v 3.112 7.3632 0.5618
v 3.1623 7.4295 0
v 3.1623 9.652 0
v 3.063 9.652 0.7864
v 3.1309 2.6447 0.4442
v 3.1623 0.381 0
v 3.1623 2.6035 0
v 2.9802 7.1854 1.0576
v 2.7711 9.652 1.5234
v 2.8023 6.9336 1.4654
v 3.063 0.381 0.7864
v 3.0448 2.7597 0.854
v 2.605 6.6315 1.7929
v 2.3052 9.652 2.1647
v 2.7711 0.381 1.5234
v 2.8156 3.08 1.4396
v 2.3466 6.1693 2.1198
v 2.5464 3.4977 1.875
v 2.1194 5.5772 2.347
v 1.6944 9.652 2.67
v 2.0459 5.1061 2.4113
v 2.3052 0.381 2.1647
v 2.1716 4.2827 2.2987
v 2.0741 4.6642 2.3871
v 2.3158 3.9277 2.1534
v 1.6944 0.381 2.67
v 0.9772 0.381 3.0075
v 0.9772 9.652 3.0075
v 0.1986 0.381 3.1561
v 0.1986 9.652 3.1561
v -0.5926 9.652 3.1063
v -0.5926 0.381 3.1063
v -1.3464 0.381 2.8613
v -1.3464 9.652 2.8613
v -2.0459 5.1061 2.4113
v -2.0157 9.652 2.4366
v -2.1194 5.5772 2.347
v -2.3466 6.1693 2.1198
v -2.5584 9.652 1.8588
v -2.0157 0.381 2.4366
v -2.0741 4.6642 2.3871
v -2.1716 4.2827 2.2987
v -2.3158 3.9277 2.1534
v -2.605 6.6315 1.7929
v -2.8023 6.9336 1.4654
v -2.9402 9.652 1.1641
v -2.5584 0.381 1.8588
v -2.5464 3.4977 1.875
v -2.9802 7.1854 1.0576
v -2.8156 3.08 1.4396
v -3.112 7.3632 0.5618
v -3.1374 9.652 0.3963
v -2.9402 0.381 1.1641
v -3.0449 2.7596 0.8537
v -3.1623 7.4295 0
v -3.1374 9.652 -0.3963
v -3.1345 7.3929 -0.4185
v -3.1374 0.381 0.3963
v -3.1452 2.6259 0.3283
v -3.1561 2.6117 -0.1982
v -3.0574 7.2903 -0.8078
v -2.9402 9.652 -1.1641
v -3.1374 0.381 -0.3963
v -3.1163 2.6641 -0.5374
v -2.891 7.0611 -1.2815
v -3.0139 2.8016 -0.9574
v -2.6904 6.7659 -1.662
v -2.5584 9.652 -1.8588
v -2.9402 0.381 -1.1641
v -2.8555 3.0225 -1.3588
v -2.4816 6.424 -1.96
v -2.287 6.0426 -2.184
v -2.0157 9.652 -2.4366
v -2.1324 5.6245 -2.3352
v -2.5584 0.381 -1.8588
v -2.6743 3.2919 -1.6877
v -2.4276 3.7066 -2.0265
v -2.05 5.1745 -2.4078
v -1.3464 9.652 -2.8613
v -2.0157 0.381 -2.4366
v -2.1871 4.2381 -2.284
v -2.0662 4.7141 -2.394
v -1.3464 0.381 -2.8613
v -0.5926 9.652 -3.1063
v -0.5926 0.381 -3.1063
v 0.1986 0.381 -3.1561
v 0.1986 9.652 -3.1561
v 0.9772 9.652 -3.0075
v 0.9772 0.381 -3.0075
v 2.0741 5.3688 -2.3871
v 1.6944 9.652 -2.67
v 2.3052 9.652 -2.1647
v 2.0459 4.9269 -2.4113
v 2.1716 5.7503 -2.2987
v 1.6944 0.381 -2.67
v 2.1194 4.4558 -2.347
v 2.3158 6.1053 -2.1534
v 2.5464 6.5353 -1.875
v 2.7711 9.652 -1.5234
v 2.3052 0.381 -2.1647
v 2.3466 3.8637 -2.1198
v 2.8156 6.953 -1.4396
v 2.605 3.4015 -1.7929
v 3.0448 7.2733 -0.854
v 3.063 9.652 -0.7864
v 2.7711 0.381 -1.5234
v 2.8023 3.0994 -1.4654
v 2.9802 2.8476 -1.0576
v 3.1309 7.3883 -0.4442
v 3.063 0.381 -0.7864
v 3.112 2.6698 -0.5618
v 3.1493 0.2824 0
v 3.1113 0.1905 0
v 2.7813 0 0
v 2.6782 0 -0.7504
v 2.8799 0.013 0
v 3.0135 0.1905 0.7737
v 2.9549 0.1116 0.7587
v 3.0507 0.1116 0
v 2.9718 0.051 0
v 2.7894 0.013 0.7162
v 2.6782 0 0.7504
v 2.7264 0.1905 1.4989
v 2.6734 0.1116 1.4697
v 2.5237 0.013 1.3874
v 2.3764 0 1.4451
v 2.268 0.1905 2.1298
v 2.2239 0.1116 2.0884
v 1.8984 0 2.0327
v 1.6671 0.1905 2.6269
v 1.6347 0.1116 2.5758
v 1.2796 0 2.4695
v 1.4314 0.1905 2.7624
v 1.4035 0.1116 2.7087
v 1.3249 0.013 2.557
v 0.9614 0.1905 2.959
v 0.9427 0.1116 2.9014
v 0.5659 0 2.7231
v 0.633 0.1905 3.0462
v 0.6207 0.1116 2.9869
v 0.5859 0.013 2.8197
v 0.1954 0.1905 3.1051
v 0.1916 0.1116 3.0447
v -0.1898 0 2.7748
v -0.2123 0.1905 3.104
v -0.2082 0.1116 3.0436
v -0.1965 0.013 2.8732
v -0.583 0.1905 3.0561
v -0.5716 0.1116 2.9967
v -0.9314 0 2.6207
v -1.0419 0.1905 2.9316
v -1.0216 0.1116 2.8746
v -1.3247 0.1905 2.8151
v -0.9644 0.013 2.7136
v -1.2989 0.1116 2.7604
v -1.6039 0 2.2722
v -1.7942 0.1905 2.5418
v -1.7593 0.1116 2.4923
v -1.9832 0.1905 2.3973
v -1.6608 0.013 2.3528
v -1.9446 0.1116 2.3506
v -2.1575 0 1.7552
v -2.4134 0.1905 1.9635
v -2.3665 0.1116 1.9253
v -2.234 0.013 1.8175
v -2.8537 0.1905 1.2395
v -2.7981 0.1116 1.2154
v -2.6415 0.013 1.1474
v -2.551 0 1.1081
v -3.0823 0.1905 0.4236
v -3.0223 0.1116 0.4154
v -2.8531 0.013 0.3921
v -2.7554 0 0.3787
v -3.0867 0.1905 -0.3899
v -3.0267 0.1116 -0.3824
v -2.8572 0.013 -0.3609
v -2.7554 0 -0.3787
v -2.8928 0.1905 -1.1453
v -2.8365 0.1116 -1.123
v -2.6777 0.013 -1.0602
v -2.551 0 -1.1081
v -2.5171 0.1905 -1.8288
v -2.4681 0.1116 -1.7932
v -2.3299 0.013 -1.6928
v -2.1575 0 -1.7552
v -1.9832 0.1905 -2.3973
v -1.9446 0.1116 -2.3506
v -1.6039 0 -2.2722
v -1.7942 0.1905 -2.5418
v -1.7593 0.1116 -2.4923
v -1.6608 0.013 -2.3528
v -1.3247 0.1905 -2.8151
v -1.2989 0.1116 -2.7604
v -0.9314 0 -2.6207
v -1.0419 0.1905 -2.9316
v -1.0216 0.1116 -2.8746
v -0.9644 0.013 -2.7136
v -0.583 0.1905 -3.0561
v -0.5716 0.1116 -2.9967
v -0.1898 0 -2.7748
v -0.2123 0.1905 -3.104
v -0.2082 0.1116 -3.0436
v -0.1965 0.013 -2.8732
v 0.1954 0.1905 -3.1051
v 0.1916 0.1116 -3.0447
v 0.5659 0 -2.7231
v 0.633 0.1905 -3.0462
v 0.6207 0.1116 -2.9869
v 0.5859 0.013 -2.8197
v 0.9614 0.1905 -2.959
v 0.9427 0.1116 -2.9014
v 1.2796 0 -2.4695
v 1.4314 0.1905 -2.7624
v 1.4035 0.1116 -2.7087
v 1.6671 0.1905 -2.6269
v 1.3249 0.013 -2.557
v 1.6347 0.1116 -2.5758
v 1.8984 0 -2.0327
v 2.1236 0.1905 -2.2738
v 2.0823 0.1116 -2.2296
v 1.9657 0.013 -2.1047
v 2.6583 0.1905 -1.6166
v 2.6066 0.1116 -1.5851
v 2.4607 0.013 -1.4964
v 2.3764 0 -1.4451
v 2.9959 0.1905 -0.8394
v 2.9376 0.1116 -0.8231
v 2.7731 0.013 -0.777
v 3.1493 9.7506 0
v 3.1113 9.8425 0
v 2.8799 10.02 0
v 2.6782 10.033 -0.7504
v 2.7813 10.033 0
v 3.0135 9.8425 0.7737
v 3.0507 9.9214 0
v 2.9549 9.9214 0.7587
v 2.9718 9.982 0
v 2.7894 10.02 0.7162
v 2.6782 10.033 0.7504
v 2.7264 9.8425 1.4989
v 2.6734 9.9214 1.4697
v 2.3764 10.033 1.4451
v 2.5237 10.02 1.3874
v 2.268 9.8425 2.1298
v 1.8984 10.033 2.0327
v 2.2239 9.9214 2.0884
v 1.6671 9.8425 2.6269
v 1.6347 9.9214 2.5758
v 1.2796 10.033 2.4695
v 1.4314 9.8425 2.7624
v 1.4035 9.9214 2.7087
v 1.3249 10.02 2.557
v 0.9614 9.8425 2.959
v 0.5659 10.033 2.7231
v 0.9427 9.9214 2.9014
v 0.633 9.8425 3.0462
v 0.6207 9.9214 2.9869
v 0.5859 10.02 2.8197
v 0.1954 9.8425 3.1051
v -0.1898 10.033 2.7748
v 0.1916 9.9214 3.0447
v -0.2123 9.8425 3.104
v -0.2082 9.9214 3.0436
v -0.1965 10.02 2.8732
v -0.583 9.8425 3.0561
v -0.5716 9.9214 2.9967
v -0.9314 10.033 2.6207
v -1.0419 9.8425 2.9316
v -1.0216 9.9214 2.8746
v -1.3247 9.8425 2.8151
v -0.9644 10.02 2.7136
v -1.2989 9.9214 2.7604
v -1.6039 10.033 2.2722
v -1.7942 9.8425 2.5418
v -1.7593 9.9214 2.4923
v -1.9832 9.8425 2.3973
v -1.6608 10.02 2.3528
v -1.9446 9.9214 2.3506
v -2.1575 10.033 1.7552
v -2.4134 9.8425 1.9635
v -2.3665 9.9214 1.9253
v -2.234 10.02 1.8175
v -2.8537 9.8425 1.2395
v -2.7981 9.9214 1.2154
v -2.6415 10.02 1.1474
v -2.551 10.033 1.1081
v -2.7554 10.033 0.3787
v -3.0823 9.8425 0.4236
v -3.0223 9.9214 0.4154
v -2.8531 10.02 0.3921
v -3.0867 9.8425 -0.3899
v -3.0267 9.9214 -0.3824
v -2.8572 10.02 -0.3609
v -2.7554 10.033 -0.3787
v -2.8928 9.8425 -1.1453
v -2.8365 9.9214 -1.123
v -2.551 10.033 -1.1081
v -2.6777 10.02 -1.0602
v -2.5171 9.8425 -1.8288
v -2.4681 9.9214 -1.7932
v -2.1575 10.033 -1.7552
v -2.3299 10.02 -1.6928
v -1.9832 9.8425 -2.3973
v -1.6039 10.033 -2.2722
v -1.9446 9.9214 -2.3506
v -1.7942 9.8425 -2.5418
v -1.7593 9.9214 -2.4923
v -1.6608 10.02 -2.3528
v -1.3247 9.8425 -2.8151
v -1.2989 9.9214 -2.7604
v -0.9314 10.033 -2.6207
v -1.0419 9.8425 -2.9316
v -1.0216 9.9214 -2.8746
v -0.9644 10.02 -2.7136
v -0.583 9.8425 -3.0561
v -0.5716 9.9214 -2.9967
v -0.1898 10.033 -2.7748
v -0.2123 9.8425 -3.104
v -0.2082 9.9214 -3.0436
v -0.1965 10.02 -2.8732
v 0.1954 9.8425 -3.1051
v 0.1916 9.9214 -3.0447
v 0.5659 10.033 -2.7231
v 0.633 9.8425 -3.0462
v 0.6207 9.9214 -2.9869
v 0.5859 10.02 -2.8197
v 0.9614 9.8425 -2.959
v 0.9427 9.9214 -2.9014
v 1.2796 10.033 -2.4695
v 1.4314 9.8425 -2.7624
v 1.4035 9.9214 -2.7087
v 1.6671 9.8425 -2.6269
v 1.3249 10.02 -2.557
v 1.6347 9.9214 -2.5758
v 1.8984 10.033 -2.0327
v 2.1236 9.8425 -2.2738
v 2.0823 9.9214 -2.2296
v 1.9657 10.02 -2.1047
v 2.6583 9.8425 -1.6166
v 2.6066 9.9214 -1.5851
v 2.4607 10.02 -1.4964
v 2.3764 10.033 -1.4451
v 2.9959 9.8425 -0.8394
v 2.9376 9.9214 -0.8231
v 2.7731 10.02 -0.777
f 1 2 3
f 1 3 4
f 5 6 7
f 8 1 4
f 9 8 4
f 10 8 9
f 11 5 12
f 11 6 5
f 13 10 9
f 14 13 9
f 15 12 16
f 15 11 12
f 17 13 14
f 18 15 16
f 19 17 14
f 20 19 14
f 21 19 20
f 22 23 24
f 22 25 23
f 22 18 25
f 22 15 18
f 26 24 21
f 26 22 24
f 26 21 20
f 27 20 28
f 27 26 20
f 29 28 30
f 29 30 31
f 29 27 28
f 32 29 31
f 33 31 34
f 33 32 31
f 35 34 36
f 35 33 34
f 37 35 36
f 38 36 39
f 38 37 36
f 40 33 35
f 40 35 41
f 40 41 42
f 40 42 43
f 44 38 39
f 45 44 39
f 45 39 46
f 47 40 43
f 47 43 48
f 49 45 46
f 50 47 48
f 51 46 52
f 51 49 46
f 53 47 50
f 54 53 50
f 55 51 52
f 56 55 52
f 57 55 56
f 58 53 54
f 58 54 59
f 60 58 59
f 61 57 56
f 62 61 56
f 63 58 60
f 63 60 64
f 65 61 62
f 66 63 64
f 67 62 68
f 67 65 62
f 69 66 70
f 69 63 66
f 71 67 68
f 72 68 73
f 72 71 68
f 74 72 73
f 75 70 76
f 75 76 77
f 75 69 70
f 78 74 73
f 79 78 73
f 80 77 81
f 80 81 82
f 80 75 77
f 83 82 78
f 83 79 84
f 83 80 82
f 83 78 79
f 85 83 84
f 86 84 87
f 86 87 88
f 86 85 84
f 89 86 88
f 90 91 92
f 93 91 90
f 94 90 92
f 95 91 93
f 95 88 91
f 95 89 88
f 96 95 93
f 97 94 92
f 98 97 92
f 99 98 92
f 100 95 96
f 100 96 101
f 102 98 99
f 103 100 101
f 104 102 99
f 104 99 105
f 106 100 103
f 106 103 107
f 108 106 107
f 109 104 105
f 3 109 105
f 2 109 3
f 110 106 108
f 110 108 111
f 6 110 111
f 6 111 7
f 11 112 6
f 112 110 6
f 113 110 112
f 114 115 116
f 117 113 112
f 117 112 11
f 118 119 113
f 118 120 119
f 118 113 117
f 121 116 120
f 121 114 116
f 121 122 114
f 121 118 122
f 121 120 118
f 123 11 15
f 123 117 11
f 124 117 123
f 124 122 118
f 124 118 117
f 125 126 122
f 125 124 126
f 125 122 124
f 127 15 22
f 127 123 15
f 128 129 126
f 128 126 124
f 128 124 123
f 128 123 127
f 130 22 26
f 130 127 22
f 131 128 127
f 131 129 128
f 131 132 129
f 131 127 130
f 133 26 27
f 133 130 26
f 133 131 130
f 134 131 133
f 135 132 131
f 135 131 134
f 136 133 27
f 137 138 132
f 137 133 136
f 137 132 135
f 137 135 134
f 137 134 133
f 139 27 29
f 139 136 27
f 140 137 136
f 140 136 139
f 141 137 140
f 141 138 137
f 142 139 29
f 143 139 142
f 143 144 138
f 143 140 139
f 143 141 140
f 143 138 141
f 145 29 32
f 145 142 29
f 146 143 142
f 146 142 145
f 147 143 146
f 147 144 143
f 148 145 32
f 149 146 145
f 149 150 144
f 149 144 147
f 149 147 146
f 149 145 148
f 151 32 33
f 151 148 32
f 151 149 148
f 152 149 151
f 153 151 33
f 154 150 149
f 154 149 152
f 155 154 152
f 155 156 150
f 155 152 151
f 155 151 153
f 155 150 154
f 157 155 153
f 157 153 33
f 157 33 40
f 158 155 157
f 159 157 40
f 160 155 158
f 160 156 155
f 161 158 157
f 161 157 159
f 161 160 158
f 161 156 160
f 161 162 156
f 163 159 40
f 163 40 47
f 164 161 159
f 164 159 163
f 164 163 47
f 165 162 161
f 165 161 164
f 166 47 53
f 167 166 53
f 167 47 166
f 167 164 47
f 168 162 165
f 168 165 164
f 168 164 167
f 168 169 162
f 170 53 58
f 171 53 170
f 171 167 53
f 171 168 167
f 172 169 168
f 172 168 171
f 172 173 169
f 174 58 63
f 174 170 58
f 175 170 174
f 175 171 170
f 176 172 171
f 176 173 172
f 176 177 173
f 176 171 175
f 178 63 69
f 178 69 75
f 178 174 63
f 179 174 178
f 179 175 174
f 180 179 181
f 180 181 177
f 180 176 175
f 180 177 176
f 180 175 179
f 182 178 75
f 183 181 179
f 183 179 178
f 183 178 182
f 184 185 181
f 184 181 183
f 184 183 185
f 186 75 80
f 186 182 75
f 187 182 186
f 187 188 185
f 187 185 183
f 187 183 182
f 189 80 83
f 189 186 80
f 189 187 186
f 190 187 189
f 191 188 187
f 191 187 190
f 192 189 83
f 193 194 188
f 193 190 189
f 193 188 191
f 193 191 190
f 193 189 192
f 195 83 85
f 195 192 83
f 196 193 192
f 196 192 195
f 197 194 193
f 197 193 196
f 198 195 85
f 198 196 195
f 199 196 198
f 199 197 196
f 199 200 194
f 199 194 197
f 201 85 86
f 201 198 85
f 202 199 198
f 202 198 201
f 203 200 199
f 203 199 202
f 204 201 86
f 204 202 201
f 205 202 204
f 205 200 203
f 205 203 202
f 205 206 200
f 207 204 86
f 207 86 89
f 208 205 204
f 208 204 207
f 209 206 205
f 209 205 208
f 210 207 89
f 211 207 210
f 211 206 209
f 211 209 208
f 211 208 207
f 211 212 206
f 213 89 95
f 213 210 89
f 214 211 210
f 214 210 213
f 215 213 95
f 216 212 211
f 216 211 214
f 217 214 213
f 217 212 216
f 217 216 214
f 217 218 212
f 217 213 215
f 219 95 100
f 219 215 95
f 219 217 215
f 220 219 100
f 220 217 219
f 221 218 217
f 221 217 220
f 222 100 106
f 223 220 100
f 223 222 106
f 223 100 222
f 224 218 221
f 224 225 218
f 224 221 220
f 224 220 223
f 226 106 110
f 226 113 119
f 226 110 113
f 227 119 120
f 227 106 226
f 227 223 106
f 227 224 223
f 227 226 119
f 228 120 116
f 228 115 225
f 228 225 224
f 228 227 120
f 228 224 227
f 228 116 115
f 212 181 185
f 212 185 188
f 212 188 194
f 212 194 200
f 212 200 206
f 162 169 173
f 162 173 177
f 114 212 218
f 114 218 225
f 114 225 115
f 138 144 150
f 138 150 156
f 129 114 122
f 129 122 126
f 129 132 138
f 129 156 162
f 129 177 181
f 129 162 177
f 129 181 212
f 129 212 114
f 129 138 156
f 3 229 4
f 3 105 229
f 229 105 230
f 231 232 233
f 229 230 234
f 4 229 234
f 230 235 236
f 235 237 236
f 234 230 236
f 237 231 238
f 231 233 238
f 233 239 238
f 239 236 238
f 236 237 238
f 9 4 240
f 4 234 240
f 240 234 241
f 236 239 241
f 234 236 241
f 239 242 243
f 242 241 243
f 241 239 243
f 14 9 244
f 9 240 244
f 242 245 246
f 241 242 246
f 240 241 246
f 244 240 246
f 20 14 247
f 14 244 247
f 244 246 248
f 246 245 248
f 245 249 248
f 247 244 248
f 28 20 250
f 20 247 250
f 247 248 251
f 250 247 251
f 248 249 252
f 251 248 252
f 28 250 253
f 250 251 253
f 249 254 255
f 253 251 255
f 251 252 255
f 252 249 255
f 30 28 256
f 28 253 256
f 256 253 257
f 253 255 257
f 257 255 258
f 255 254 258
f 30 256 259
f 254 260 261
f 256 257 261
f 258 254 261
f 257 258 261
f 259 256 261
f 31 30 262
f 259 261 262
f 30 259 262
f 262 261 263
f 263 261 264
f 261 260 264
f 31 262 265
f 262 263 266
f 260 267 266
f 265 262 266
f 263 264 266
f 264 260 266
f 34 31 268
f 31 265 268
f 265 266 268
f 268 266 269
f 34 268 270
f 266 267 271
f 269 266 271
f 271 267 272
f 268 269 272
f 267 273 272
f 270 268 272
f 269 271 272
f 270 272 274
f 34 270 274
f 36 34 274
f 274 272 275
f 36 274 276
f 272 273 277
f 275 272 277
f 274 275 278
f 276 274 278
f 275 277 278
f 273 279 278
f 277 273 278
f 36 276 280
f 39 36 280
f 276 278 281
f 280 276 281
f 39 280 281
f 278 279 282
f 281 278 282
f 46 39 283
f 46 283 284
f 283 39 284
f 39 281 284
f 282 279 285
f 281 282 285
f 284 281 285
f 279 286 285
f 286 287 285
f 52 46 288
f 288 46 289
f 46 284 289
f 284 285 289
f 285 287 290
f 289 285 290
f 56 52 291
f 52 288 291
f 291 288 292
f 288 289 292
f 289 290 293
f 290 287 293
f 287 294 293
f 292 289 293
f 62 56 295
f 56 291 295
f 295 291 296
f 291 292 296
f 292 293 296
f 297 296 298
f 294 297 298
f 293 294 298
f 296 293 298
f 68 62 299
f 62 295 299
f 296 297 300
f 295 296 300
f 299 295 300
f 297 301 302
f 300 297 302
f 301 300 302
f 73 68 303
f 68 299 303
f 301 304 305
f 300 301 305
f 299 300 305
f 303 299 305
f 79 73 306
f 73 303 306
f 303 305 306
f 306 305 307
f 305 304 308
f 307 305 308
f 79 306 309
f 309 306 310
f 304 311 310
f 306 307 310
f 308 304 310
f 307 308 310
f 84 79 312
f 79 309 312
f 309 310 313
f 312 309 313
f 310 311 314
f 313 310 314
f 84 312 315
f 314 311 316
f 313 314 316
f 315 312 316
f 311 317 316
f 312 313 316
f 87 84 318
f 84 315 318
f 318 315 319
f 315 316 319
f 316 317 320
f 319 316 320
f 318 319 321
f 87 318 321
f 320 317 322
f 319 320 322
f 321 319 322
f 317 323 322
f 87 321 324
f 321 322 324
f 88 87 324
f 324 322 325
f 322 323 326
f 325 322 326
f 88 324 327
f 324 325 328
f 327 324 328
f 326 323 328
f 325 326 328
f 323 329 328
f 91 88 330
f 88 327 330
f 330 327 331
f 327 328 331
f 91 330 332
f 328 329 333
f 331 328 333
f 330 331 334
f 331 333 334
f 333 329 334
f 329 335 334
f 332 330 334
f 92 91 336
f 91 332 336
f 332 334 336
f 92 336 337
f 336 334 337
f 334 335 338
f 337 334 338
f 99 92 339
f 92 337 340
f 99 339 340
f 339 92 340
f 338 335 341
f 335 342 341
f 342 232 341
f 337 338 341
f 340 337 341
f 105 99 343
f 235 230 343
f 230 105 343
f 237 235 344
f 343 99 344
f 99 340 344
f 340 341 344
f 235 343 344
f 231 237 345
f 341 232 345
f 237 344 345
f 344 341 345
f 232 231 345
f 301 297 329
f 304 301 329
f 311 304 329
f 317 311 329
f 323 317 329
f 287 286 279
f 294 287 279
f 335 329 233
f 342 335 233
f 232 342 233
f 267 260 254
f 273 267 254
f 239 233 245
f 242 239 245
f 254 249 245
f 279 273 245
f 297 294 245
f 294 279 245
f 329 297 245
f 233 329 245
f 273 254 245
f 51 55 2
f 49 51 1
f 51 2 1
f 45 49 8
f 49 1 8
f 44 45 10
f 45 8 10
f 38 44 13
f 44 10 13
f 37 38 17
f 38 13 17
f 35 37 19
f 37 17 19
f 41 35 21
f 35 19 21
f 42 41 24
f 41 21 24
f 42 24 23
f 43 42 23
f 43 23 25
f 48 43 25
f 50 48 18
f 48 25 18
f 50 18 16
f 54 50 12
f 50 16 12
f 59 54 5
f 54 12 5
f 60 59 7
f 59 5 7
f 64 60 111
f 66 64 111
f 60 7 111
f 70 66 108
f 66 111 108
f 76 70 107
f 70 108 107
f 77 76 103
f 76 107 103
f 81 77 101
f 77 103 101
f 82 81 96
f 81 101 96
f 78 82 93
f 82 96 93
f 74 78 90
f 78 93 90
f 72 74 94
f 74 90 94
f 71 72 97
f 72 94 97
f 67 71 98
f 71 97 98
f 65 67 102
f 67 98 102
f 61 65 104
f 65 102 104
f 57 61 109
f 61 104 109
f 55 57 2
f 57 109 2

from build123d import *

# Parameters (mm, degrees)
F0_R     = 3.1623
F1_DEPTH = 10.033
F2_R     = 2.413
F3_DEPTH = 3.81
F4_R     = 0.381


with BuildPart() as f1:
    # F0 (on Front) → F1 (new body)
    with BuildSketch(Plane.XZ):
        Circle(F0_R)
    extrude(amount=-F1_DEPTH)

    # F2 (on Right) → F3 (cut, symmetric)
    with BuildSketch(Plane.YZ):
        with Locations((5.0165, 0)):
            Circle(F2_R)
    extrude(amount=F3_DEPTH, both=True, mode=Mode.SUBTRACT)

    # F4
    f4_edges = [f1.edges().sort_by_distance(p)[0] for p in [
        (-3.1623, 10.033, 0),
        (-3.1623, 0, 0),
    ]]
    fillet(f4_edges, radius=F4_R)


solid = f1.part
